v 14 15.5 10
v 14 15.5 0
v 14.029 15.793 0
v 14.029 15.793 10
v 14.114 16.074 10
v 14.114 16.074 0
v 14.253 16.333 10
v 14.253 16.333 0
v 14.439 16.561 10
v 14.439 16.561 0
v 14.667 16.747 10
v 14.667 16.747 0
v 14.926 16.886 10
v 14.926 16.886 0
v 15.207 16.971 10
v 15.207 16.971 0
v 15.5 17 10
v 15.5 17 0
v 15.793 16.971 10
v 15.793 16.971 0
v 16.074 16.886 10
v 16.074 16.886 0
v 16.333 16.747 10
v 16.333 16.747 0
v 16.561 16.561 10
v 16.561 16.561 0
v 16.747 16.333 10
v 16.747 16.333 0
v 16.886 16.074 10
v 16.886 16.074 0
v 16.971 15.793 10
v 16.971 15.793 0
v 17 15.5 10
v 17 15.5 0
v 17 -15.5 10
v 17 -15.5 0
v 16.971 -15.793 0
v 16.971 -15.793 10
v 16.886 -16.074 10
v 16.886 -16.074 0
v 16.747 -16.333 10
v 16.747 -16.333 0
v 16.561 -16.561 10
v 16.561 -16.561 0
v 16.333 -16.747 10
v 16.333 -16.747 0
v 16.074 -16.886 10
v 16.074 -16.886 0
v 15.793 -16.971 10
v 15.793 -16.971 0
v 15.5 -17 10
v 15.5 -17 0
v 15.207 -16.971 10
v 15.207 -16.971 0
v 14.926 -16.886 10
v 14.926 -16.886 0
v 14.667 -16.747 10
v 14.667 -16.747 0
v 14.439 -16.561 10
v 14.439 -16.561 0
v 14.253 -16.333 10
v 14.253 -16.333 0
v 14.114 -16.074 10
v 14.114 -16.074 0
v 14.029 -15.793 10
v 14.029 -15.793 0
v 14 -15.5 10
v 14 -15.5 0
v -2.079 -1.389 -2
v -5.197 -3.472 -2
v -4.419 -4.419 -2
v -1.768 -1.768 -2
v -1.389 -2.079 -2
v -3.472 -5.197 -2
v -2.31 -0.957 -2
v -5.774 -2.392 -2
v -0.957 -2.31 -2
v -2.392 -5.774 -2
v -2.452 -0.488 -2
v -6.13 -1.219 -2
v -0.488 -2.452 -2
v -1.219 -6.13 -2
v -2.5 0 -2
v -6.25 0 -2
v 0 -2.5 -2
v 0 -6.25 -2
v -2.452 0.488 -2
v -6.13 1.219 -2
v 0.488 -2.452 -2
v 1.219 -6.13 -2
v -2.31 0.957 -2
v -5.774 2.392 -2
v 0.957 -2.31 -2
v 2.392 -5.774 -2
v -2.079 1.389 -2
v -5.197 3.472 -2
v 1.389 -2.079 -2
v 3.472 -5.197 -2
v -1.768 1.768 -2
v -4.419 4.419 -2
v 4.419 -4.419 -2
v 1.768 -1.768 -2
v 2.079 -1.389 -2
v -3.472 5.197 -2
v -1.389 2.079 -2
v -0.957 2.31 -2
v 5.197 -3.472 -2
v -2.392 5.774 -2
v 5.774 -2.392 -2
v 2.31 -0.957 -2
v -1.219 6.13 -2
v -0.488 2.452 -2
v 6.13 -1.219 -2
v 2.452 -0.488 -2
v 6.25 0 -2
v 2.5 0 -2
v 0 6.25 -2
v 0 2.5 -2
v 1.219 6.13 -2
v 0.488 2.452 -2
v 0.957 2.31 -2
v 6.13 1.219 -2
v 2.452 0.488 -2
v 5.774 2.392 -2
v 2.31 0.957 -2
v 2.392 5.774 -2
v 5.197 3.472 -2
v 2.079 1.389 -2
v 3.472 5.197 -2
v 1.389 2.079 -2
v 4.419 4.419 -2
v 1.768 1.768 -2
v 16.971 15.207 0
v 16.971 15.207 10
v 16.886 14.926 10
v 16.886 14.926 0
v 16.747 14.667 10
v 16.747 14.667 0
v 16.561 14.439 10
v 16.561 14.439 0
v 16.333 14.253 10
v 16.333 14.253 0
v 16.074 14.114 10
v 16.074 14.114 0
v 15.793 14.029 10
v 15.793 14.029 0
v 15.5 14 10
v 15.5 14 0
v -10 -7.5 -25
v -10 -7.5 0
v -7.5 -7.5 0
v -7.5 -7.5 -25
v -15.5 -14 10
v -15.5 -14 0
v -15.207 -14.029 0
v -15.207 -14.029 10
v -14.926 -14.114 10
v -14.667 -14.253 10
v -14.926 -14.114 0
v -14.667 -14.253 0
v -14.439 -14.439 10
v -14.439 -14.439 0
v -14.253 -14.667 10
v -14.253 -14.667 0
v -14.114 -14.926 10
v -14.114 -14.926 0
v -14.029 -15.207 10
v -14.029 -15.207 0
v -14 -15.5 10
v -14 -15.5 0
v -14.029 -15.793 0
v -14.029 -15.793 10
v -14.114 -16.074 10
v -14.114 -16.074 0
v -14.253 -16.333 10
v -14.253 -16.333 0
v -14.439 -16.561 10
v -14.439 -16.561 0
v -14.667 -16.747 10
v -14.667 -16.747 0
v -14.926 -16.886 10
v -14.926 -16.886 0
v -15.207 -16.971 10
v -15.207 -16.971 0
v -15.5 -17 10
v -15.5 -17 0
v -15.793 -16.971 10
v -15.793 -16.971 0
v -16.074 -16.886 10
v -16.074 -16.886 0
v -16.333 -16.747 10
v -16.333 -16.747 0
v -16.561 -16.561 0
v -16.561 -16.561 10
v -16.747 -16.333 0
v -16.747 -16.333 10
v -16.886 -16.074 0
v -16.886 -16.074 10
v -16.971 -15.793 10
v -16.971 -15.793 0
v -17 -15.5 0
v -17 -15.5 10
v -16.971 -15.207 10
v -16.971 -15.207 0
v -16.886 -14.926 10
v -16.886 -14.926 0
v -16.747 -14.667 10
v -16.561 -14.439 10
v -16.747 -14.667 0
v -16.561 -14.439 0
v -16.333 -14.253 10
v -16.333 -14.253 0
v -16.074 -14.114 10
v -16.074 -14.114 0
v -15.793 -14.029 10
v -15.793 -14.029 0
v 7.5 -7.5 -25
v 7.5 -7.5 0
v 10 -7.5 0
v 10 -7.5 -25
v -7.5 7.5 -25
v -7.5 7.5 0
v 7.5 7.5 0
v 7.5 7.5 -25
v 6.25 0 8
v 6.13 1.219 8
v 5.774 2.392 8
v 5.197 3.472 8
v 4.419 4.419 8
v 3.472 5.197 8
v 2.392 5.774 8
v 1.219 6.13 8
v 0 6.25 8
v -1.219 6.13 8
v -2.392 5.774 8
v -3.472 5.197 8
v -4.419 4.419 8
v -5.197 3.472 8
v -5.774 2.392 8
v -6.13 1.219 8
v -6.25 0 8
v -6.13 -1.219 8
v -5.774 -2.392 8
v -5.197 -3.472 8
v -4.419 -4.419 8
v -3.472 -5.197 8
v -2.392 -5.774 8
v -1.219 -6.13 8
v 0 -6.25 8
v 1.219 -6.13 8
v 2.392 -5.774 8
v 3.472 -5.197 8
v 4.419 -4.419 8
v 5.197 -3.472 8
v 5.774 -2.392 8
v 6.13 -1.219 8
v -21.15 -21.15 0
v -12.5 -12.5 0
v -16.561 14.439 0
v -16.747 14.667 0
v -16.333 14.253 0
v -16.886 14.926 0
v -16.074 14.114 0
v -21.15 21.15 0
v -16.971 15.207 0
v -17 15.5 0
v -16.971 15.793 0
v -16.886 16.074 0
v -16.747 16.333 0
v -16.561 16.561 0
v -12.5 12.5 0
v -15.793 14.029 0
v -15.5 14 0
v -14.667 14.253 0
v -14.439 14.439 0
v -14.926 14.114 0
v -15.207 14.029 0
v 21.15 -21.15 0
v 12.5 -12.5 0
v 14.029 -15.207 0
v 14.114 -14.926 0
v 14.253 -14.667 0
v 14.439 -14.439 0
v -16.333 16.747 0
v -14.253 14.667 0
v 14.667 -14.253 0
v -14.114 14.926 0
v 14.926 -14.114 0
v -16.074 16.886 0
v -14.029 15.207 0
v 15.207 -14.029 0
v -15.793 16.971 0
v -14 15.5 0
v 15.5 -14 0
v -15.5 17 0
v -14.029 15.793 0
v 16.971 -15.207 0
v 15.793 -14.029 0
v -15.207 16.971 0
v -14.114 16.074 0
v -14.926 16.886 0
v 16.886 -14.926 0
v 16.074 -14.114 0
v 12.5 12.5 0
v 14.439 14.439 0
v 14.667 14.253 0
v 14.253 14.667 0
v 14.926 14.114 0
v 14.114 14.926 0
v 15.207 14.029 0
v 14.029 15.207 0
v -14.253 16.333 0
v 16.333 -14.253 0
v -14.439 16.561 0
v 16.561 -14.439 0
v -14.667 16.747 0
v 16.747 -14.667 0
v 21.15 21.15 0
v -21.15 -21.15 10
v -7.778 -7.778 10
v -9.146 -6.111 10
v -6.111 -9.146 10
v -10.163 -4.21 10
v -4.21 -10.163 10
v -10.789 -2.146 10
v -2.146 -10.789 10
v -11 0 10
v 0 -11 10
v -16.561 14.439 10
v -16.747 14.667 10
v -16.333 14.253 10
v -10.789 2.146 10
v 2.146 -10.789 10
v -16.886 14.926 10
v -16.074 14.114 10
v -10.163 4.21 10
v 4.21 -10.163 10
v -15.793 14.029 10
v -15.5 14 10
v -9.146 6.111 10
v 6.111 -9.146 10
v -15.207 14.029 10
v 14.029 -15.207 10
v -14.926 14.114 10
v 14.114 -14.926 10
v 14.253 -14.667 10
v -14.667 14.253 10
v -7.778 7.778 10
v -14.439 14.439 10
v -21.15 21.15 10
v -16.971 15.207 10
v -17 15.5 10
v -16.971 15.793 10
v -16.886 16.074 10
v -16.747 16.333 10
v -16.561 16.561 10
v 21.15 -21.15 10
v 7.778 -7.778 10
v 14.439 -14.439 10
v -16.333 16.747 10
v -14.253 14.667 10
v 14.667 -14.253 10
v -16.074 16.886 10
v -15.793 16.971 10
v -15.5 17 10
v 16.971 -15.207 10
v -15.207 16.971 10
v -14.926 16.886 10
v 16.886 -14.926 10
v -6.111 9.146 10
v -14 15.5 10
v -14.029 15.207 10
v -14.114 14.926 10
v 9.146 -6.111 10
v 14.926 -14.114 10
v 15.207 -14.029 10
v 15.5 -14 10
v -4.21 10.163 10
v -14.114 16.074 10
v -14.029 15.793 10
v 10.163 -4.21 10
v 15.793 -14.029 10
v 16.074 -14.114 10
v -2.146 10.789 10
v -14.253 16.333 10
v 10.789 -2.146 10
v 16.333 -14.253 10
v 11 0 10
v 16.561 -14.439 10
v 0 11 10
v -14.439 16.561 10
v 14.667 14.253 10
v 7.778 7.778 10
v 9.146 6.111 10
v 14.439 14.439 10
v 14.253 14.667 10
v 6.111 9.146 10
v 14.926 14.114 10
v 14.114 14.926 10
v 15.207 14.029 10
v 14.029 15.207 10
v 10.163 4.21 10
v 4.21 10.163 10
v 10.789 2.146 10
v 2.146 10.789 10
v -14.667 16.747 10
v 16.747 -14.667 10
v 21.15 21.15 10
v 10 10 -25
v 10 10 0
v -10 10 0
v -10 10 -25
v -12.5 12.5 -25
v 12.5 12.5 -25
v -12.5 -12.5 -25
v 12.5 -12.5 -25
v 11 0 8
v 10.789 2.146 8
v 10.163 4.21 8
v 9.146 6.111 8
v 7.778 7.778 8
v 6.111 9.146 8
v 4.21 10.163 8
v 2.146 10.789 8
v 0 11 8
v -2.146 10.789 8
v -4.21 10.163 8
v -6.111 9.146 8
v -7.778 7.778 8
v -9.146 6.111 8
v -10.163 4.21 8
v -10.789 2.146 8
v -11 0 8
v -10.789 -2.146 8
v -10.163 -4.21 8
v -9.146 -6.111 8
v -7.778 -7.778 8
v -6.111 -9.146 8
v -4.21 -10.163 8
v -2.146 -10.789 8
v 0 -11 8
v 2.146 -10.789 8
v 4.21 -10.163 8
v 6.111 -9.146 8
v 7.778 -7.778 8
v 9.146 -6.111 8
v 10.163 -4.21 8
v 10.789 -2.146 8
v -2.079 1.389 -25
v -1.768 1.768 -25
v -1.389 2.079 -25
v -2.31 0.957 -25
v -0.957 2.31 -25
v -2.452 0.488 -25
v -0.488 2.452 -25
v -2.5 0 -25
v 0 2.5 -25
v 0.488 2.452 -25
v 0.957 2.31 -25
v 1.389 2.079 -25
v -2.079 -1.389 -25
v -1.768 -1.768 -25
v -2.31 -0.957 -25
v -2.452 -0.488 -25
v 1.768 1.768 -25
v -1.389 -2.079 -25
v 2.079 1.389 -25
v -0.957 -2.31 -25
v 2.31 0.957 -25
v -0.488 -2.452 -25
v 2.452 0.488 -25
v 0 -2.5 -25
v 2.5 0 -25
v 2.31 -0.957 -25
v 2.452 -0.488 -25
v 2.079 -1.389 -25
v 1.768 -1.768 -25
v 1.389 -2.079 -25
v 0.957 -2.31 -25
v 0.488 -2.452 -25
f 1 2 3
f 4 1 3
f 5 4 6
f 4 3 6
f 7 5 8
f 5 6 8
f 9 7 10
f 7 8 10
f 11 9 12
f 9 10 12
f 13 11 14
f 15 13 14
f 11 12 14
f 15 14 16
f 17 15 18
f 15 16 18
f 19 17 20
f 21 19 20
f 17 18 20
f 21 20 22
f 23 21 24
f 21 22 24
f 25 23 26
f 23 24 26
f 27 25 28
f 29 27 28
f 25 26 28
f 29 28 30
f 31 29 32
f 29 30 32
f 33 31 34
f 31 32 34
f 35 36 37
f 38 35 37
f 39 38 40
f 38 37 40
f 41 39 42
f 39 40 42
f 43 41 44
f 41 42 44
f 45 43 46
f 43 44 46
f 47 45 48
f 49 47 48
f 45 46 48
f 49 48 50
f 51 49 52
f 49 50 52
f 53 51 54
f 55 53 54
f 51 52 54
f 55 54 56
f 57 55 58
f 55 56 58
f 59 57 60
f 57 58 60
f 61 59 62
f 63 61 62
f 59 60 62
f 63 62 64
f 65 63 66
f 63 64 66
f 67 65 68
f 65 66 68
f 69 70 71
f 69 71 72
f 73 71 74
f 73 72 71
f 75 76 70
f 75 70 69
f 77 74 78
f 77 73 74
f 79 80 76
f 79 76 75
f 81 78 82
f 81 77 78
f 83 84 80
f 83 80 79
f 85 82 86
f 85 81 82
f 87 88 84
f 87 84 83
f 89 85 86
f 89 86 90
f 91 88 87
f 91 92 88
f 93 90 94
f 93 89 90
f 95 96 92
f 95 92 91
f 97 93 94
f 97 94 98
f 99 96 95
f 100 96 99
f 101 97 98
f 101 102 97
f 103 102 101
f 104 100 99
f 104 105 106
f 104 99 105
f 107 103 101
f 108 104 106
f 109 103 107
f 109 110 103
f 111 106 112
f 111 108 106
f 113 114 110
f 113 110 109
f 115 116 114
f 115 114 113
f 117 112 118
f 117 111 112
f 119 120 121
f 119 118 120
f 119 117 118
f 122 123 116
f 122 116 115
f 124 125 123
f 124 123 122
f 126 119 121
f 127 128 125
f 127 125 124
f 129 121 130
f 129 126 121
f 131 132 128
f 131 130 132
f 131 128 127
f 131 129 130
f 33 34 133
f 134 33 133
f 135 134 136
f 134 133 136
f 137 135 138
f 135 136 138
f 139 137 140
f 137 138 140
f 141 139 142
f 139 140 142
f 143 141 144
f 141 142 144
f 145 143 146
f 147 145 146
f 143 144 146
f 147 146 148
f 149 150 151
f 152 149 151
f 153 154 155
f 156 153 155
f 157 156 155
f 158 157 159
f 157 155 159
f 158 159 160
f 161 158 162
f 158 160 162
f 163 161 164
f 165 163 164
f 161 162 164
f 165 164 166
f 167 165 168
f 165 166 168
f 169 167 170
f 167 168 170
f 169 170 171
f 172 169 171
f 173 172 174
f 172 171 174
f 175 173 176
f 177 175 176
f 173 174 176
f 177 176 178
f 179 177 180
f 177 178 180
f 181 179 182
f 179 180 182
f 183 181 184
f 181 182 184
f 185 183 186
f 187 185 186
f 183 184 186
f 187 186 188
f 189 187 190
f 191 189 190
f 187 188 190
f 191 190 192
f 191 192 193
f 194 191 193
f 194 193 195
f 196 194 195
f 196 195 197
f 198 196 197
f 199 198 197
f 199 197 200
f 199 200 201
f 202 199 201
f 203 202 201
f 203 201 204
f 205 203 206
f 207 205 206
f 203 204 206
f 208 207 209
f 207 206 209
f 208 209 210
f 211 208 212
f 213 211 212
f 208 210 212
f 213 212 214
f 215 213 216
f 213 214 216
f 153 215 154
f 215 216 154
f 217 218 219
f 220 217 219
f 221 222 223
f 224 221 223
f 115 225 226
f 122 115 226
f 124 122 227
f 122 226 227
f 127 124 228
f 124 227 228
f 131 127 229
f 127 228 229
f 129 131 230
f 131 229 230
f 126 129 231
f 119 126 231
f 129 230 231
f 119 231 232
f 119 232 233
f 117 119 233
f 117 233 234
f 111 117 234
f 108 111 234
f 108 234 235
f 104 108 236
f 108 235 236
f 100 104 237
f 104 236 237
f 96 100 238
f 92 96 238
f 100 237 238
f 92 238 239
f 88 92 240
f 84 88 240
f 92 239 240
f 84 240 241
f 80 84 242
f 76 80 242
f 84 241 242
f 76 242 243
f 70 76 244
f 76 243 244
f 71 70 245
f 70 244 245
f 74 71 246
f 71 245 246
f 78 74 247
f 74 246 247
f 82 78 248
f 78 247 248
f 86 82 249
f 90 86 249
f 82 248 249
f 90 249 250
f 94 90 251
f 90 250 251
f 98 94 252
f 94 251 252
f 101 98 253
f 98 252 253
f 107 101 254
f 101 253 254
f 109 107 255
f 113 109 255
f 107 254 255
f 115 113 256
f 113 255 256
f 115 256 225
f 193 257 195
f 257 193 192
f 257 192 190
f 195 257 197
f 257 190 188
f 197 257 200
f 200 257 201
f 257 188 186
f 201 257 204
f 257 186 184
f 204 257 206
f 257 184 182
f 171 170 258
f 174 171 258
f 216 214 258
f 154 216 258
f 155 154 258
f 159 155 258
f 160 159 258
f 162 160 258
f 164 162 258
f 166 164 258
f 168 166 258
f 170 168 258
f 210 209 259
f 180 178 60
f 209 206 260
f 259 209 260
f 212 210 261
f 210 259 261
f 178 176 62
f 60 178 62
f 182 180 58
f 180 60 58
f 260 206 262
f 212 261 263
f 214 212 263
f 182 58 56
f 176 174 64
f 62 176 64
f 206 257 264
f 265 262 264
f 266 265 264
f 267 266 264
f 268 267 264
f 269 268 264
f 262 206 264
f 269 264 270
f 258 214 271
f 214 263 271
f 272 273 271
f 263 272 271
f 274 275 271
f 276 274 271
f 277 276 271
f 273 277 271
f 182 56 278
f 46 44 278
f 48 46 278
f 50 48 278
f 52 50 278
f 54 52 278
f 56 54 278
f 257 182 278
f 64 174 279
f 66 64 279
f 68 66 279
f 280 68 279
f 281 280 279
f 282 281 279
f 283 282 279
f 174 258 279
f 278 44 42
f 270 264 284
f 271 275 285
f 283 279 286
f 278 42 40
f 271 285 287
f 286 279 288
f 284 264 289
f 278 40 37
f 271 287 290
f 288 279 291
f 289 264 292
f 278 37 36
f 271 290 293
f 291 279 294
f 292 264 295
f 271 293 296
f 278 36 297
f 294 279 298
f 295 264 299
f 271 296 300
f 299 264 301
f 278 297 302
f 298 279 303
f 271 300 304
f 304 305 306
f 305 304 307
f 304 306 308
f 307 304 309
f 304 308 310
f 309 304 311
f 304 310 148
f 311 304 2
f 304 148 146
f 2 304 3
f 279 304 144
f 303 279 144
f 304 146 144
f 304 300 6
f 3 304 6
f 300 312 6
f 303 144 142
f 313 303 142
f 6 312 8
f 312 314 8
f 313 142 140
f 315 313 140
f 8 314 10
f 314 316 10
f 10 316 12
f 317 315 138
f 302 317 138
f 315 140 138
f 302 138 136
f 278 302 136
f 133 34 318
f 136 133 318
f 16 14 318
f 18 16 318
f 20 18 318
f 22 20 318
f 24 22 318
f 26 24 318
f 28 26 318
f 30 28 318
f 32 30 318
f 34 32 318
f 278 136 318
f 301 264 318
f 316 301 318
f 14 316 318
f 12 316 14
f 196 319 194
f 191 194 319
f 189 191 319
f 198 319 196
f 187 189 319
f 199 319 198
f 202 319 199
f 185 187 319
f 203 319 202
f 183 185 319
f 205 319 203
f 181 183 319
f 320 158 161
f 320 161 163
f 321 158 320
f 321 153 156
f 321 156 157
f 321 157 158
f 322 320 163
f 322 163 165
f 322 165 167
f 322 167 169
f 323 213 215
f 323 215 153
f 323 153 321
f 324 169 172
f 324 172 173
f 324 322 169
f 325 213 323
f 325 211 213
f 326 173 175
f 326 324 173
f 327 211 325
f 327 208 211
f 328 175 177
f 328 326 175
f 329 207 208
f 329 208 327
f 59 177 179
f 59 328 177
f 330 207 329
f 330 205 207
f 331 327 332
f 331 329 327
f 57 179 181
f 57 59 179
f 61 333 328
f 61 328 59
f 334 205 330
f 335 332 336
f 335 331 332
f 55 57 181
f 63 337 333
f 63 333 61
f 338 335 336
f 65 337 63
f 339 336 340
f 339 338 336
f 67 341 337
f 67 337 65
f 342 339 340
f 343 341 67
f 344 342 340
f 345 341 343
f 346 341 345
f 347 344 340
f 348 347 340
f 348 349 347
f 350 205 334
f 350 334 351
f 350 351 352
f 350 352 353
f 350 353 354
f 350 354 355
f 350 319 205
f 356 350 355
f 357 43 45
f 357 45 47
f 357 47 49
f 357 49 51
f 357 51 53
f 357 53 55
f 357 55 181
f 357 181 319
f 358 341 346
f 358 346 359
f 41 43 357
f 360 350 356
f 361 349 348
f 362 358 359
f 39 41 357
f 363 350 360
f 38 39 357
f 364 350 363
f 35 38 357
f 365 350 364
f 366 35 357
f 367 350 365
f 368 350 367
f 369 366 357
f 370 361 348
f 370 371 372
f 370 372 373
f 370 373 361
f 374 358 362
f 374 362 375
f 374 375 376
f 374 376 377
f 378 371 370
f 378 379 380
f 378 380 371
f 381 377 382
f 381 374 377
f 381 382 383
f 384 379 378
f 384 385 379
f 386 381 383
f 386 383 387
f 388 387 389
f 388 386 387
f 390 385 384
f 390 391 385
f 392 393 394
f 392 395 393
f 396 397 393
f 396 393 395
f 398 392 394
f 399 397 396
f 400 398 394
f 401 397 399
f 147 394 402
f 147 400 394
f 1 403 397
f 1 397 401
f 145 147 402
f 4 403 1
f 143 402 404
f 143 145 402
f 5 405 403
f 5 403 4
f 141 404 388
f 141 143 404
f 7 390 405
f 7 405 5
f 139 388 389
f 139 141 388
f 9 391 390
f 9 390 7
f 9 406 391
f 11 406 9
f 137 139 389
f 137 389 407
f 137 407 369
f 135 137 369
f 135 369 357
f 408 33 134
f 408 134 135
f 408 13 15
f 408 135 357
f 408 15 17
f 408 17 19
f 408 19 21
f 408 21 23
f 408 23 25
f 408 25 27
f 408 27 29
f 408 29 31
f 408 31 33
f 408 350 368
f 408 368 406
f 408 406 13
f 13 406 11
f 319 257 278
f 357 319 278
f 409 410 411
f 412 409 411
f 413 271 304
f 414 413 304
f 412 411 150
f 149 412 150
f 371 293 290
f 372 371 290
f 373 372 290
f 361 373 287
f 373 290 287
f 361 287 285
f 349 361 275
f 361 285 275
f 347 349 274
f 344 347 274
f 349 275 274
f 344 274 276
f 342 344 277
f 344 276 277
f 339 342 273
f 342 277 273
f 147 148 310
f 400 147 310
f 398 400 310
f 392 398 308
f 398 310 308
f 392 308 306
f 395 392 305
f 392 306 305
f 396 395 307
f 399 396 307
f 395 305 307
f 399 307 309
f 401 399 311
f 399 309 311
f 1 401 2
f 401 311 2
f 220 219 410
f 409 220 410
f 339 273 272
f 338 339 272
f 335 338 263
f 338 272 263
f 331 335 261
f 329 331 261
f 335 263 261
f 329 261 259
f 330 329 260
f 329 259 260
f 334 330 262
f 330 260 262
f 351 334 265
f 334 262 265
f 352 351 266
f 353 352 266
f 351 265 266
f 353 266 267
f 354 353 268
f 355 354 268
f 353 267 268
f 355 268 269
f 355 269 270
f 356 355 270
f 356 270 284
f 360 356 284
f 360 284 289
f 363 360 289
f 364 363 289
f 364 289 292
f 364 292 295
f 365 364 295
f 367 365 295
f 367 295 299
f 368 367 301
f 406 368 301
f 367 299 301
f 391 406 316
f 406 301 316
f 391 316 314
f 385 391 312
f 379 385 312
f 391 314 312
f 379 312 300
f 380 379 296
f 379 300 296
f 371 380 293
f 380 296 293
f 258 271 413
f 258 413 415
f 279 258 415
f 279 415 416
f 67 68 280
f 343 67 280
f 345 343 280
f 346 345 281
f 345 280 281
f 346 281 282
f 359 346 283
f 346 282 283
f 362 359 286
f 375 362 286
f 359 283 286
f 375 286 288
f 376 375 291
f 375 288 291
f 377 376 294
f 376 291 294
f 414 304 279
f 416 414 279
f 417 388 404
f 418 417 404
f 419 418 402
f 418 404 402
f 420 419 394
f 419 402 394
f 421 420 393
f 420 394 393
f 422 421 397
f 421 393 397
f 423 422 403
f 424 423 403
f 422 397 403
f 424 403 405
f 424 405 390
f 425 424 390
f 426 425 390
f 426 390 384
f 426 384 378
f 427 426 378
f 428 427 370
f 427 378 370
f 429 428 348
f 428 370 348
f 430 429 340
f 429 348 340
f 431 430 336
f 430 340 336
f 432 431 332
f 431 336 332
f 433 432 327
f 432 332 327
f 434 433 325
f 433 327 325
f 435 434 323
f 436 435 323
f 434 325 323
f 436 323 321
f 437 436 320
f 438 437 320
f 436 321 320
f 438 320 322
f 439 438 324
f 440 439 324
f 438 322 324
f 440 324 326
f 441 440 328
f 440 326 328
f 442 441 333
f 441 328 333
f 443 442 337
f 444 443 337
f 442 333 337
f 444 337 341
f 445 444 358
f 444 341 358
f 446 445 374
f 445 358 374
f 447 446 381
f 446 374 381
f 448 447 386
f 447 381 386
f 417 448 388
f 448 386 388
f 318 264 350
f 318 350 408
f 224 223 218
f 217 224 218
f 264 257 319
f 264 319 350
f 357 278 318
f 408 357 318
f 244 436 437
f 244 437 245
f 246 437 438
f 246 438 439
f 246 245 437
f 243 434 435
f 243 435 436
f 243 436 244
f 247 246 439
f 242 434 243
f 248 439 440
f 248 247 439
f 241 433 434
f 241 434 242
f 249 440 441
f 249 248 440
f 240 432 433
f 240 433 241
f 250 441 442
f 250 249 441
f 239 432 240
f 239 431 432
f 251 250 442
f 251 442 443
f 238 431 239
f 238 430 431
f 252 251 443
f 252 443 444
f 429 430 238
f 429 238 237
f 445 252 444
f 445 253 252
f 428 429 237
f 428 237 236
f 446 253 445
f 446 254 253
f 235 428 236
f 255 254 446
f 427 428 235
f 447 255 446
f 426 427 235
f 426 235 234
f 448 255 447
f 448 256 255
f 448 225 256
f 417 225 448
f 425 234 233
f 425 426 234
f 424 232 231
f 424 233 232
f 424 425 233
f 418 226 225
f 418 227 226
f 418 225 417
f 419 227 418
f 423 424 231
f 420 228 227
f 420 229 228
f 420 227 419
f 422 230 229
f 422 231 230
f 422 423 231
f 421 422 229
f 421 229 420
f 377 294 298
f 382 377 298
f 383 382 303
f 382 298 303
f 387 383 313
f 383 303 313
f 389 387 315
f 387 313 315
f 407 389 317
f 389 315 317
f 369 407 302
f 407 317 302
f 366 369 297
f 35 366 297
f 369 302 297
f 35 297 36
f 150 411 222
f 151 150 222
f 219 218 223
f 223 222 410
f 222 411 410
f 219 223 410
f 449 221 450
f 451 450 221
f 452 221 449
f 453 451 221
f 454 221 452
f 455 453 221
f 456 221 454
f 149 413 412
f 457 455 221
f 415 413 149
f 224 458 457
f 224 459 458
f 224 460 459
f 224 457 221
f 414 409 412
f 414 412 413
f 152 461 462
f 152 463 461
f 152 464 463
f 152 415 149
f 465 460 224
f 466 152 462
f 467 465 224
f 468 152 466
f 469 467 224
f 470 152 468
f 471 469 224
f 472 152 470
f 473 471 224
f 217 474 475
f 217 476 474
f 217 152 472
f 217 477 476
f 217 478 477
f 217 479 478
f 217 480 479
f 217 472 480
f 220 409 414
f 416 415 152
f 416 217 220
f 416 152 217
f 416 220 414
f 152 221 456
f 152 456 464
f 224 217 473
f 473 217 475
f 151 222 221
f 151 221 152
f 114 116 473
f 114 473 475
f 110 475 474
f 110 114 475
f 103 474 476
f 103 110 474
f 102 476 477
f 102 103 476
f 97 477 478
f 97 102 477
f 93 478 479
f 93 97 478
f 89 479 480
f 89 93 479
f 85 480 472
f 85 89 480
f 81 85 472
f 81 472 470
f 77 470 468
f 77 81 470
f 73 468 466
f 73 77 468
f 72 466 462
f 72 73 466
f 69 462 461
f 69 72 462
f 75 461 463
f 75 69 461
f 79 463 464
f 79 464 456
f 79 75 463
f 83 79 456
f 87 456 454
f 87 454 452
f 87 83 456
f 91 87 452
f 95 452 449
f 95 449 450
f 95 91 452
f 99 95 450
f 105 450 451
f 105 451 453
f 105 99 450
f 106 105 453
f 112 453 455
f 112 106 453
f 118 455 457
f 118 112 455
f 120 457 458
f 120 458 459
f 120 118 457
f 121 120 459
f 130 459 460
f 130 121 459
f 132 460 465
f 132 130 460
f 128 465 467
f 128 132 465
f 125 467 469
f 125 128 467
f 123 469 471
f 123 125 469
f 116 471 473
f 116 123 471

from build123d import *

# Parameters (mm, degrees)
F0_W     = 42.3
F0_H     = 42.3
F0_R     = 7.5
F0_R_2   = 2.5
F1_DEPTH = 10
F2_R     = 11
F3_DEPTH = 2
F4_W     = 25
F4_H     = 25
F4_W_2   = 15
F4_H_2   = 15
F4_R     = 2.5
F5_DEPTH = 25
F6_R     = 6.25
F7_DEPTH = 10


with BuildPart() as f1:
    # F0 (on Top) → F1 (new body)
    with BuildSketch(Plane.XY):
        Rectangle(F0_W, F0_H)
        with BuildLine():
            Line((14, -15.5), (-14, -15.5))
            ThreePointArc((-14, -15.5), (-16.5606601718, -16.5606601718), (-15.5, -14))
            Line((-15.5, -14), (-15.5, 14))
            ThreePointArc((-15.5, 14), (-16.5606601718, 16.5606601718), (-14, 15.5))
            Line((-14, 15.5), (14, 15.5))
            ThreePointArc((14, 15.5), (15.5, 17), (17, 15.5))
            ThreePointArc((17, 15.5), (16.5606601718, 14.4393398282), (15.5, 14))
            Line((15.5, 14), (15.5, -14))
            ThreePointArc((15.5, -14), (16.5606601718, -14.4393398282), (17, -15.5))
            ThreePointArc((17, -15.5), (15.5, -17), (14, -15.5))
        make_face(mode=Mode.SUBTRACT)
        with BuildLine():
            ThreePointArc((-15.5, -14), (-14.4393398282, -14.4393398282), (-14, -15.5))
            Line((-14, -15.5), (14, -15.5))
            ThreePointArc((14, -15.5), (14.4393398282, -14.4393398282), (15.5, -14))
            Line((15.5, -14), (15.5, 14))
            ThreePointArc((15.5, 14), (14.4393398282, 14.4393398282), (14, 15.5))
            Line((14, 15.5), (-14, 15.5))
            ThreePointArc((-14, 15.5), (-14.4393398282, 14.4393398282), (-15.5, 14))
            Line((-15.5, 14), (-15.5, -14))
        make_face()
        Circle(F0_R, mode=Mode.SUBTRACT)
        Circle(F0_R)
        Circle(F0_R_2, mode=Mode.SUBTRACT)
    extrude(amount=F1_DEPTH)

    # F2 (on face) → F3 (cut)
    with BuildSketch(Plane.XY.offset(10)):
        Circle(F2_R)
    extrude(amount=-F3_DEPTH, mode=Mode.SUBTRACT)

    # F4 (on face) → F5 (join)
    with BuildSketch(Plane(origin=(0, 0, 0), x_dir=(1, 0, 0), z_dir=(0, 0, -1))):
        Rectangle(F4_W, F4_H)
        Polygon((-10, 7.5), (-10, 10), (10, 10), (10, 7.5), (10, -10), (-10, -10), align=None, mode=Mode.SUBTRACT)
        Rectangle(F4_W_2, F4_H_2)
        Circle(F4_R, mode=Mode.SUBTRACT)
        Polygon((10, 10), (-10, 10), (-10, 7.5), (-7.5, 7.5), (7.5, 7.5), (10, 7.5), align=None)
    extrude(amount=F5_DEPTH)

    # F6 (on face) → F7 (cut)
    with BuildSketch(Plane.XY.offset(8)):
        Circle(F6_R)
    extrude(amount=-F7_DEPTH, mode=Mode.SUBTRACT)


solid = f1.part
